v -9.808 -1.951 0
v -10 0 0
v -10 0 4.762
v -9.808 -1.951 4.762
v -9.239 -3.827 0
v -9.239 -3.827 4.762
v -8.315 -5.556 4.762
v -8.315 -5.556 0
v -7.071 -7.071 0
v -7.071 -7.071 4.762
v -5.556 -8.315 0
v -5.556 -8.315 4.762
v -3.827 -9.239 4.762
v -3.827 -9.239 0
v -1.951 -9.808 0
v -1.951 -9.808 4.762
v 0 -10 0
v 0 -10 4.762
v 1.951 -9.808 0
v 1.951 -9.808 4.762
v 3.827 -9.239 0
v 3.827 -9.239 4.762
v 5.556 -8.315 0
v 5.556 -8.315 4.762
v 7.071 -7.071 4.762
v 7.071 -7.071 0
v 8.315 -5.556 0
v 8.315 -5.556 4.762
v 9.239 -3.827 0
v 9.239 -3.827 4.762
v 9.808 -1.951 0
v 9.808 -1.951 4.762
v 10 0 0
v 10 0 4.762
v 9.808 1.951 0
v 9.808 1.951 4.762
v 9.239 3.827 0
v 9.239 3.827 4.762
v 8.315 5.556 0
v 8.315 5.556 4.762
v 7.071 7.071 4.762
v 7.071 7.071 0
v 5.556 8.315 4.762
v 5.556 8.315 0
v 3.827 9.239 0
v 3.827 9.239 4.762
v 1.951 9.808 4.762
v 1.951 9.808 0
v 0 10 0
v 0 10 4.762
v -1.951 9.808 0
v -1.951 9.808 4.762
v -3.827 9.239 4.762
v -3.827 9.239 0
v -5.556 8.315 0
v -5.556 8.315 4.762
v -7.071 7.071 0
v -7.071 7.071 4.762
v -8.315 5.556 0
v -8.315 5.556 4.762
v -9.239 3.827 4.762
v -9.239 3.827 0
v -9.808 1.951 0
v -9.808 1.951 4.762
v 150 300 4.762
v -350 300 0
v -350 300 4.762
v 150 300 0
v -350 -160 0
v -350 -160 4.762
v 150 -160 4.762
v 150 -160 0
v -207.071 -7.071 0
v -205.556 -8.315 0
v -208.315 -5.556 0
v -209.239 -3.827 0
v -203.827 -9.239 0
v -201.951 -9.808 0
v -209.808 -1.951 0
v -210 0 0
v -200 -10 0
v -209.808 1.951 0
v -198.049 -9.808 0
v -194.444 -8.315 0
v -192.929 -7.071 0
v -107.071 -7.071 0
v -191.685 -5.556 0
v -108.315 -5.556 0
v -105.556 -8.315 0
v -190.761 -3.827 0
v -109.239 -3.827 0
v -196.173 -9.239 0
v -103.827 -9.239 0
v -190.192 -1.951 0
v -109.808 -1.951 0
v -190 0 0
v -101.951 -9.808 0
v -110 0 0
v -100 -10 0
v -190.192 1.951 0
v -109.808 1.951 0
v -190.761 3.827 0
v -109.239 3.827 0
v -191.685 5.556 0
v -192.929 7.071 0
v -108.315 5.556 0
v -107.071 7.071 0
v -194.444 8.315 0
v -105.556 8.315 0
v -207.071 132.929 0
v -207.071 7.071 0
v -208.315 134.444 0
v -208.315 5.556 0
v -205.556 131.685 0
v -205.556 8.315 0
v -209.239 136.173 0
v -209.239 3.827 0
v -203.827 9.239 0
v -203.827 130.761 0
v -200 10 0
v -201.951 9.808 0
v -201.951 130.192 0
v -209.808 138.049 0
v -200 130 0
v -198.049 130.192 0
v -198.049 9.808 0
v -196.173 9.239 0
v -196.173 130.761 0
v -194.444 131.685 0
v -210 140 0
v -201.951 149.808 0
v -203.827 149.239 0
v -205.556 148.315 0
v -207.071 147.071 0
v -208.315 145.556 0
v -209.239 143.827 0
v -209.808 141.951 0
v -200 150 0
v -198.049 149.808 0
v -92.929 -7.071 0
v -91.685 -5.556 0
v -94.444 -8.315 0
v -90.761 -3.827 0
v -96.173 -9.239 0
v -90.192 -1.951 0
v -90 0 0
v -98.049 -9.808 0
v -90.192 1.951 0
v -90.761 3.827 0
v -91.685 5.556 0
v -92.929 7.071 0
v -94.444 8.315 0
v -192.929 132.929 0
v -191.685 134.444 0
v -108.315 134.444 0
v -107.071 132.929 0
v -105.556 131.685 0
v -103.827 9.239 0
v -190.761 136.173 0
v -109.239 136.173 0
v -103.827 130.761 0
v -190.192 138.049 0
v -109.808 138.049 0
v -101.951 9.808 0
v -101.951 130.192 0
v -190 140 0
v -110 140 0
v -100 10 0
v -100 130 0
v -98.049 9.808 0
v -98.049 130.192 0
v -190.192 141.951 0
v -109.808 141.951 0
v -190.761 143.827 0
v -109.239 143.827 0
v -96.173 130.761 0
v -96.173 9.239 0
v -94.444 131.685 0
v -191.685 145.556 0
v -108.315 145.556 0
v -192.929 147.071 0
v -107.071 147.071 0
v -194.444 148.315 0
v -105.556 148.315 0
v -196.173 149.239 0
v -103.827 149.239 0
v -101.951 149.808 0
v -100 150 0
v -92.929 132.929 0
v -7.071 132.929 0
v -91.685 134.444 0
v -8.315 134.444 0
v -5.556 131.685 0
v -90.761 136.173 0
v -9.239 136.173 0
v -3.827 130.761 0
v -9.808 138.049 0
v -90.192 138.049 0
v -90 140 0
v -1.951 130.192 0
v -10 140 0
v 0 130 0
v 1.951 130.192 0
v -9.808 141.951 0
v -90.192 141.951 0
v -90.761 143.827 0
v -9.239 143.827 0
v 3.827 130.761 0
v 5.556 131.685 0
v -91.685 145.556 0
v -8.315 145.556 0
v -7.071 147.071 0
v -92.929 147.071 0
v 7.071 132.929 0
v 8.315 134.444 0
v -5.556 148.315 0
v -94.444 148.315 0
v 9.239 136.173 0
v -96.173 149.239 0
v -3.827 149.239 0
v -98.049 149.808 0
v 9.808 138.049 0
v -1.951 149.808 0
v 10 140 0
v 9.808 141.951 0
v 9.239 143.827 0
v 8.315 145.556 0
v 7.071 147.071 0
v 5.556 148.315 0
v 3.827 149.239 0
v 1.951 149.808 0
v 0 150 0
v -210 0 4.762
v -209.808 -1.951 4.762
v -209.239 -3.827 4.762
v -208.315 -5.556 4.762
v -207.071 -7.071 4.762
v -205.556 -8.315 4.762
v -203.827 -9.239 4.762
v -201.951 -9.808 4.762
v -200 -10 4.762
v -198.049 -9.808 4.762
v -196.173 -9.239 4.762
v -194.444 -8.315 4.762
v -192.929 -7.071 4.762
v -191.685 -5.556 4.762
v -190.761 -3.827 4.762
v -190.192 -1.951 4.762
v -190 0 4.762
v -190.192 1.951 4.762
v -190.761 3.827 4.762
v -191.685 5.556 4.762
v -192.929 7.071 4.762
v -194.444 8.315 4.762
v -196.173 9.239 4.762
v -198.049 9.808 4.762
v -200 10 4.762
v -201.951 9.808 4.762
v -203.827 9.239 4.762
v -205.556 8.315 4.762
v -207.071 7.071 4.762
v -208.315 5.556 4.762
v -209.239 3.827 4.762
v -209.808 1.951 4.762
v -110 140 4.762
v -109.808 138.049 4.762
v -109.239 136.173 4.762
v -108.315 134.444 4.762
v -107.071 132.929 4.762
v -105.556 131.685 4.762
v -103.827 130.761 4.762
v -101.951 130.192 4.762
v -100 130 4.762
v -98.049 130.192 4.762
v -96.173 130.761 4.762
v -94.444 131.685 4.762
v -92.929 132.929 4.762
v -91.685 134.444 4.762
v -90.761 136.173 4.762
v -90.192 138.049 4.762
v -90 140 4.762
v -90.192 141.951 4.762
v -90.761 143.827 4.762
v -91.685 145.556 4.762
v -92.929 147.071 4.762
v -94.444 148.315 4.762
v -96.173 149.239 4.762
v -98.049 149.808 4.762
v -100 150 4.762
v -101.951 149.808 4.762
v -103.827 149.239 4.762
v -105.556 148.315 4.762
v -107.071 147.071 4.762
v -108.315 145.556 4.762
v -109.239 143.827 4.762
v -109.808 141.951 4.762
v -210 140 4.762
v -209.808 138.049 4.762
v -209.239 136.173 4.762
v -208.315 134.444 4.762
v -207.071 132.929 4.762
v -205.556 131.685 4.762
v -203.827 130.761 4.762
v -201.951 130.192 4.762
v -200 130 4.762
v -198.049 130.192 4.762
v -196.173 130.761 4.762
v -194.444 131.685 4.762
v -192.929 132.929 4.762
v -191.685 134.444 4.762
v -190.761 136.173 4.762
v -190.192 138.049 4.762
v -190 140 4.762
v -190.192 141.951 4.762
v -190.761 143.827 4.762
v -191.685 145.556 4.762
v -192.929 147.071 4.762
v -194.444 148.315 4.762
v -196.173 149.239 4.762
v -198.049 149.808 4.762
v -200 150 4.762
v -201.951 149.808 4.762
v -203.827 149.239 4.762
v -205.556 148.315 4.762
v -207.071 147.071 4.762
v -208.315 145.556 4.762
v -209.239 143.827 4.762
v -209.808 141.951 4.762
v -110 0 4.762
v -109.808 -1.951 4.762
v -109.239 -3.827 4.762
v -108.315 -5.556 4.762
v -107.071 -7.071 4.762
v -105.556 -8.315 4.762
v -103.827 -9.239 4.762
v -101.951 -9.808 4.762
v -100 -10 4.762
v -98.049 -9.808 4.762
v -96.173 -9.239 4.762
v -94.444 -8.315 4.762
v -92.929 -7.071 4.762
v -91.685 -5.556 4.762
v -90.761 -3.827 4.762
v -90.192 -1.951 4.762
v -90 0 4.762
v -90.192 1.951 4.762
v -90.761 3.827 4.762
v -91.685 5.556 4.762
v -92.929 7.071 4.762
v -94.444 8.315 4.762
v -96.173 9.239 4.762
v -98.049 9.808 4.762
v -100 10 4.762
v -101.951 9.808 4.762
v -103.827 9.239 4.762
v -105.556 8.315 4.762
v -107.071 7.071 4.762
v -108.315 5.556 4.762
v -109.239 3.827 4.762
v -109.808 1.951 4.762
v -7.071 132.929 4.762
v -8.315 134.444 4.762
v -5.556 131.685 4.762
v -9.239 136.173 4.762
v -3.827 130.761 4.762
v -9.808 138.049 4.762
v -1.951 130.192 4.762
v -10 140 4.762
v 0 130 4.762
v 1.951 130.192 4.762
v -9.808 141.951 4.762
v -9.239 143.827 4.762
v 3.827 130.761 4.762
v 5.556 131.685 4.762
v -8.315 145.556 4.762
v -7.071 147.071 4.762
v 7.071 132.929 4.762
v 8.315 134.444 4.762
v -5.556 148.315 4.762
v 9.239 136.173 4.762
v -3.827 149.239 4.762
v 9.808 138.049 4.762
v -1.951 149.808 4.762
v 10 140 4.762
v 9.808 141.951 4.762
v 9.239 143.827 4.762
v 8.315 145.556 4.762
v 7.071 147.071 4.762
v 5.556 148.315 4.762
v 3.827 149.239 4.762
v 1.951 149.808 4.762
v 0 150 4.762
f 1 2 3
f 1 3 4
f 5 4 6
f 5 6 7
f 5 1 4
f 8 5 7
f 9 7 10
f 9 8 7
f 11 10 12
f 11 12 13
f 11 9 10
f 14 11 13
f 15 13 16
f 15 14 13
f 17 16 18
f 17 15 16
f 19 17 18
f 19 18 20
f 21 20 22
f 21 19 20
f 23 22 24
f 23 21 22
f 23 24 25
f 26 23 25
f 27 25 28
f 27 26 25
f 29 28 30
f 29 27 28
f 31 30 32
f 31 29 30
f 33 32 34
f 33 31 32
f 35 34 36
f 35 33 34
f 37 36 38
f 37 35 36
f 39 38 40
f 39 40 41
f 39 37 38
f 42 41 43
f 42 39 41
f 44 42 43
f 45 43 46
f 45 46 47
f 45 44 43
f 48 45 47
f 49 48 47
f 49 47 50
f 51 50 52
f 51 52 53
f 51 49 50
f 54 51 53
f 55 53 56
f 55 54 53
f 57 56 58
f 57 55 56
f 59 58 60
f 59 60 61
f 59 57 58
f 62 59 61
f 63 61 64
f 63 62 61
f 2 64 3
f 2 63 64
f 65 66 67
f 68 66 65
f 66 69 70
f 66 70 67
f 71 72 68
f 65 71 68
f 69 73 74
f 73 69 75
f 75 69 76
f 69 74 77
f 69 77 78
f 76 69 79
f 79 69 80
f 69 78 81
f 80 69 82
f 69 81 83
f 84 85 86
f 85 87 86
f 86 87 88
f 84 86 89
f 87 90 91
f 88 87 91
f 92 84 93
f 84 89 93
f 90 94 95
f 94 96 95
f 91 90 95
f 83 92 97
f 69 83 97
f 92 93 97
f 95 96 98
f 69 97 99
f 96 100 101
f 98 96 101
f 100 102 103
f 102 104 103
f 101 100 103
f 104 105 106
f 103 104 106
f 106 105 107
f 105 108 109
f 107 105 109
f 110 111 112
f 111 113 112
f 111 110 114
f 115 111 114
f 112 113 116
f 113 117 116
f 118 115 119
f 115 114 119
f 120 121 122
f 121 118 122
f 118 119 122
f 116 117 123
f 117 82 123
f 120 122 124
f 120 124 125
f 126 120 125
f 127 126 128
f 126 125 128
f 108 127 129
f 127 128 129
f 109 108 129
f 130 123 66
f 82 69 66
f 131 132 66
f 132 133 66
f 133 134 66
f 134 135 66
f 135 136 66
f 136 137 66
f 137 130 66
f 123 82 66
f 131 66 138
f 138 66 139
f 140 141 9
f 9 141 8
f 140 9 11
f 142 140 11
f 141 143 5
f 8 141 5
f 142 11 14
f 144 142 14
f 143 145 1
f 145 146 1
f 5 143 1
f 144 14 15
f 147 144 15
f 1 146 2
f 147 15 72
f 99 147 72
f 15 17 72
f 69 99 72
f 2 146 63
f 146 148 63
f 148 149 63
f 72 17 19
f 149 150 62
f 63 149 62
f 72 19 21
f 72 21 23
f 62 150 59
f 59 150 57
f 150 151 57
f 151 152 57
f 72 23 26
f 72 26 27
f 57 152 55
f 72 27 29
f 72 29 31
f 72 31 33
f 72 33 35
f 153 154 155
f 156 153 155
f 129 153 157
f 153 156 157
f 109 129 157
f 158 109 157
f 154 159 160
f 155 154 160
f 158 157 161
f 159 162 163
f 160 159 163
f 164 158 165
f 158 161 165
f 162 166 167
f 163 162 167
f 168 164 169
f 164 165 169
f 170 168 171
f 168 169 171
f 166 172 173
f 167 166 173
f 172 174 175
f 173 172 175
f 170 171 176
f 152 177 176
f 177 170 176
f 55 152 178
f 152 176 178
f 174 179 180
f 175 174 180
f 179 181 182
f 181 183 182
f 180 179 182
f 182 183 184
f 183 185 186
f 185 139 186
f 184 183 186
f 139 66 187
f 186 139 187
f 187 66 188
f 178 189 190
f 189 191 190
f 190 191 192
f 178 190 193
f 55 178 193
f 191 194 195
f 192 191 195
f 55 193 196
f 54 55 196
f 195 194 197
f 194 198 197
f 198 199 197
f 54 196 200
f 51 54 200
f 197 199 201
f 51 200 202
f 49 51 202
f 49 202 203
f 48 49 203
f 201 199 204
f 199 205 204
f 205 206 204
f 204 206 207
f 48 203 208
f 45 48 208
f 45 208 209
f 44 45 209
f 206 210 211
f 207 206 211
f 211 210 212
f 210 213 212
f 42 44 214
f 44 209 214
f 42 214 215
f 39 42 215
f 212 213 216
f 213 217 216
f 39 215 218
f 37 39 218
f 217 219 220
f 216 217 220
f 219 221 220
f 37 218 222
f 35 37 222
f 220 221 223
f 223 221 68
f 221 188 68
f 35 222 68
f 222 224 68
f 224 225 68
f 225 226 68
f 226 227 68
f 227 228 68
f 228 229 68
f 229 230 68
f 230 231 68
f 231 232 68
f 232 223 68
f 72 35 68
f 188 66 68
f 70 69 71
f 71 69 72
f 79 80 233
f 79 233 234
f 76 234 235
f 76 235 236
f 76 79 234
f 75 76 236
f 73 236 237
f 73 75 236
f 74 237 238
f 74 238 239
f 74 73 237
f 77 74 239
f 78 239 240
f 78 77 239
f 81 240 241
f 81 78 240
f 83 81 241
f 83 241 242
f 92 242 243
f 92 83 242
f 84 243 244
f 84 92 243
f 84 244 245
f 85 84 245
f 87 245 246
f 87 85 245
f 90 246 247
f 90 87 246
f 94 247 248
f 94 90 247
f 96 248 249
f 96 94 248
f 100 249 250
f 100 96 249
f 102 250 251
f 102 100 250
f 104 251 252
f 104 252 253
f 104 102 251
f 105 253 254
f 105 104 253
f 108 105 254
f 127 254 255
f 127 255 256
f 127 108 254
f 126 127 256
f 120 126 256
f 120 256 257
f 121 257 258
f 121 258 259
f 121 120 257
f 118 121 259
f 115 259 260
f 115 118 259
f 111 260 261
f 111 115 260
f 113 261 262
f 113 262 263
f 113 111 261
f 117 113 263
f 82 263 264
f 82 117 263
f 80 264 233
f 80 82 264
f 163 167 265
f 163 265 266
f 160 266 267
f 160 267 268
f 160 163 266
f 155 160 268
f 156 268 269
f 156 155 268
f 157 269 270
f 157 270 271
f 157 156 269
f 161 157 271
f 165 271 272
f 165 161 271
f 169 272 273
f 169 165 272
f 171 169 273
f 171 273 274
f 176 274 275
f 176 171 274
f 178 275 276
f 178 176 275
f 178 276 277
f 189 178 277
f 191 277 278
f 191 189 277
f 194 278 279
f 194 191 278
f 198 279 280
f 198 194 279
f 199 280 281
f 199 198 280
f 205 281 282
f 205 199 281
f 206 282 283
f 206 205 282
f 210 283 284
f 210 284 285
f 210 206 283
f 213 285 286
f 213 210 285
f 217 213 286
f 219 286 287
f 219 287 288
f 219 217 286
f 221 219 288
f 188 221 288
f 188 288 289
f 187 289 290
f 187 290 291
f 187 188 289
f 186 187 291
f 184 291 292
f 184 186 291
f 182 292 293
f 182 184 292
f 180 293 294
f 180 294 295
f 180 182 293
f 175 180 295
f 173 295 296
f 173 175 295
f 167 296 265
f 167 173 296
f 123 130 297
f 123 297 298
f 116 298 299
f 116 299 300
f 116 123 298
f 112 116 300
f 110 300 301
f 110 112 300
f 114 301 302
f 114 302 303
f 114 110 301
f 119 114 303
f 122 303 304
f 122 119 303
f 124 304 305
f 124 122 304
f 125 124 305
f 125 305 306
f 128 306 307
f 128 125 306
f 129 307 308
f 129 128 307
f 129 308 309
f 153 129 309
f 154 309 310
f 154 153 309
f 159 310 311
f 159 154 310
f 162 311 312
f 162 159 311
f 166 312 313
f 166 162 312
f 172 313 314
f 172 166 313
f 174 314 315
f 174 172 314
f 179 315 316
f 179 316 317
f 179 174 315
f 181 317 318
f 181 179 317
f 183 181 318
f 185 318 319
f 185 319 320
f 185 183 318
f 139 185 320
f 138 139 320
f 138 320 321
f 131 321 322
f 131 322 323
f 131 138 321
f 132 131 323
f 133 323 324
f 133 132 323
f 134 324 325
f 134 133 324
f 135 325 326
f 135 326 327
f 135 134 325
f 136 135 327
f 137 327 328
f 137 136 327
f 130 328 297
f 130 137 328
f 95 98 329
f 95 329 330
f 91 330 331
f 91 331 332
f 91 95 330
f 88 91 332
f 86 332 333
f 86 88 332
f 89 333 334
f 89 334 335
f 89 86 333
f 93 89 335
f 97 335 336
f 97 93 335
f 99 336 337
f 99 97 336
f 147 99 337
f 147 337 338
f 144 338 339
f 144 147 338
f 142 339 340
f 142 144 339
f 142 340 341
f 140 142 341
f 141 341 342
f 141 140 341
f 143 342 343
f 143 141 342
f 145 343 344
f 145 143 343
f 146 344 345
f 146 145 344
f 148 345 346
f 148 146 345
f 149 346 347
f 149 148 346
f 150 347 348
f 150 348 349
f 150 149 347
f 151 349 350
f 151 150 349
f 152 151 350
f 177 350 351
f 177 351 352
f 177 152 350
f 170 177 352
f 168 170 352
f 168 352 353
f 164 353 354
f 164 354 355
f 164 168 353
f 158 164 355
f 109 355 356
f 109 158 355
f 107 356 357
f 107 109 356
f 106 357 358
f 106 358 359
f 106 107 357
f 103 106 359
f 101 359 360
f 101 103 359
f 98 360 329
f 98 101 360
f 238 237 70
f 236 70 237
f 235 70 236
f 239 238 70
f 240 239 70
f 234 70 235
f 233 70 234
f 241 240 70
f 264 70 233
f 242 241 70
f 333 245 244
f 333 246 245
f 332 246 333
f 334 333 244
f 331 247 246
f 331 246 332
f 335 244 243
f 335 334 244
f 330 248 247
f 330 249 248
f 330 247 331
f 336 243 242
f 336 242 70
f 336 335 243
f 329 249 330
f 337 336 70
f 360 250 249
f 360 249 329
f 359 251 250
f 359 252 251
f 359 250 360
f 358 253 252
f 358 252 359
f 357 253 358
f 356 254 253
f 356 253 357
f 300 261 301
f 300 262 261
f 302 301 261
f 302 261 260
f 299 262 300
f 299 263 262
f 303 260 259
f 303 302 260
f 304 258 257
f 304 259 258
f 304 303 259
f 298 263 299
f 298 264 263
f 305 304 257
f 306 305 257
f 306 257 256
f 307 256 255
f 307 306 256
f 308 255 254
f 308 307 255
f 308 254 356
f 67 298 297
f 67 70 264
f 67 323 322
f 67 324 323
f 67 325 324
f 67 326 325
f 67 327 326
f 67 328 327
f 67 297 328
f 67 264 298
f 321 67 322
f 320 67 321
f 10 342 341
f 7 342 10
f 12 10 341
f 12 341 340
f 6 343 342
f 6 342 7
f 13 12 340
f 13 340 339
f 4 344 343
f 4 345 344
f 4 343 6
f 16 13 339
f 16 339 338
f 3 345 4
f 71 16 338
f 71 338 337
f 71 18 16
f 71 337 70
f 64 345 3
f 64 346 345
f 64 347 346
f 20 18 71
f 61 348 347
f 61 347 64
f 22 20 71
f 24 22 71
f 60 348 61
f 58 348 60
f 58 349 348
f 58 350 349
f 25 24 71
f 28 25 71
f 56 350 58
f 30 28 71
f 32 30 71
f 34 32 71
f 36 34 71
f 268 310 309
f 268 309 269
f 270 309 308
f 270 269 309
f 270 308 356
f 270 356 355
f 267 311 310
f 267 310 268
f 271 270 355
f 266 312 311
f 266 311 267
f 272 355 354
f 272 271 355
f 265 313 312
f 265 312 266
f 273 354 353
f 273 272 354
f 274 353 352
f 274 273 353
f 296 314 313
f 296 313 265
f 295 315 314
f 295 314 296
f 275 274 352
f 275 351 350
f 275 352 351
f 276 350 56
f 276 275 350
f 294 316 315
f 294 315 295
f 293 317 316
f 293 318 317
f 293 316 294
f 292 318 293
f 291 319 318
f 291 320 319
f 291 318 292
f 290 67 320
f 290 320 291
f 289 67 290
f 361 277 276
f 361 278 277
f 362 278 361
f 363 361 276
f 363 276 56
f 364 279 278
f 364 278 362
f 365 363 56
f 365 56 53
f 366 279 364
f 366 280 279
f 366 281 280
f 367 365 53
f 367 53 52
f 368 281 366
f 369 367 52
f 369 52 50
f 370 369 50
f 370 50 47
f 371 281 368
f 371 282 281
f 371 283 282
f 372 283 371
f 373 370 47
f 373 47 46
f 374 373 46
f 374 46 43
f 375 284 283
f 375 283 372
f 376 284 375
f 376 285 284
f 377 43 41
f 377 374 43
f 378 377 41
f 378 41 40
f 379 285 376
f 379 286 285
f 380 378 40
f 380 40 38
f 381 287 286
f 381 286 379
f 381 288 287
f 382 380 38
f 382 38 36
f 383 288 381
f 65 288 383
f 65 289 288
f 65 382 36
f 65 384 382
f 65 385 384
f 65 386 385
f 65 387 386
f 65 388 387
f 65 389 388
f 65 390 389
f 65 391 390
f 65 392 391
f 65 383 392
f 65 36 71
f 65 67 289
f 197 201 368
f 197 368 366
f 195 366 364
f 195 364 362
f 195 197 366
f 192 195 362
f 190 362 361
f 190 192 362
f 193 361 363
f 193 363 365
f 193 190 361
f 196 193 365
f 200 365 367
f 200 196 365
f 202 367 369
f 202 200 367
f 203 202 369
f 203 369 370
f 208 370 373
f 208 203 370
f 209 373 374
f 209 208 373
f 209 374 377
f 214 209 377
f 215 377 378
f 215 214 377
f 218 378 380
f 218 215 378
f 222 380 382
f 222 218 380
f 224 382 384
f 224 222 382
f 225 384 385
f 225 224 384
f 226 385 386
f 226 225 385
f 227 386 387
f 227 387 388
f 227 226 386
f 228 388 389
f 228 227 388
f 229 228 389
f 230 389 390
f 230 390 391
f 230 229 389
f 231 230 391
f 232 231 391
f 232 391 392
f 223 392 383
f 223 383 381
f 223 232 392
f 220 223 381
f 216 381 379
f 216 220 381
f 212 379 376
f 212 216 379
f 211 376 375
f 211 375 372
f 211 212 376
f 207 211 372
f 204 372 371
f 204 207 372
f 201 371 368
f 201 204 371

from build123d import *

# Parameters (mm, degrees)
ESBO_O1_W                = 500
ESBO_O1_H                = 460
ESBO_O1_R                = 10
RESSALTO_EXTRUS_O1_DEPTH = 4.7625


with BuildPart() as part:
    # Esboço1 → Ressalto-extrusão1 (new body)
    with BuildSketch(Plane.XY):
        with Locations((-100, 70)):
            Rectangle(ESBO_O1_W, ESBO_O1_H)
        with Locations(Location((0, 0, 0), (0, 0, 180))):
            Circle(ESBO_O1_R, mode=Mode.SUBTRACT)
        with Locations(Location((-100, 0, 0), (0, 0, 180))):
            Circle(ESBO_O1_R, mode=Mode.SUBTRACT)
        with Locations(Location((-200, 0, 0), (0, 0, 180))):
            Circle(ESBO_O1_R, mode=Mode.SUBTRACT)
        with Locations(Location((-200, 140, 0), (0, 0, 180))):
            Circle(ESBO_O1_R, mode=Mode.SUBTRACT)
        with Locations(Location((-100, 140, 0), (0, 0, 180))):
            Circle(ESBO_O1_R, mode=Mode.SUBTRACT)
        with Locations(Location((0, 140, 0), (0, 0, 180))):
            Circle(ESBO_O1_R, mode=Mode.SUBTRACT)
    extrude(amount=RESSALTO_EXTRUS_O1_DEPTH)


solid = part.part
